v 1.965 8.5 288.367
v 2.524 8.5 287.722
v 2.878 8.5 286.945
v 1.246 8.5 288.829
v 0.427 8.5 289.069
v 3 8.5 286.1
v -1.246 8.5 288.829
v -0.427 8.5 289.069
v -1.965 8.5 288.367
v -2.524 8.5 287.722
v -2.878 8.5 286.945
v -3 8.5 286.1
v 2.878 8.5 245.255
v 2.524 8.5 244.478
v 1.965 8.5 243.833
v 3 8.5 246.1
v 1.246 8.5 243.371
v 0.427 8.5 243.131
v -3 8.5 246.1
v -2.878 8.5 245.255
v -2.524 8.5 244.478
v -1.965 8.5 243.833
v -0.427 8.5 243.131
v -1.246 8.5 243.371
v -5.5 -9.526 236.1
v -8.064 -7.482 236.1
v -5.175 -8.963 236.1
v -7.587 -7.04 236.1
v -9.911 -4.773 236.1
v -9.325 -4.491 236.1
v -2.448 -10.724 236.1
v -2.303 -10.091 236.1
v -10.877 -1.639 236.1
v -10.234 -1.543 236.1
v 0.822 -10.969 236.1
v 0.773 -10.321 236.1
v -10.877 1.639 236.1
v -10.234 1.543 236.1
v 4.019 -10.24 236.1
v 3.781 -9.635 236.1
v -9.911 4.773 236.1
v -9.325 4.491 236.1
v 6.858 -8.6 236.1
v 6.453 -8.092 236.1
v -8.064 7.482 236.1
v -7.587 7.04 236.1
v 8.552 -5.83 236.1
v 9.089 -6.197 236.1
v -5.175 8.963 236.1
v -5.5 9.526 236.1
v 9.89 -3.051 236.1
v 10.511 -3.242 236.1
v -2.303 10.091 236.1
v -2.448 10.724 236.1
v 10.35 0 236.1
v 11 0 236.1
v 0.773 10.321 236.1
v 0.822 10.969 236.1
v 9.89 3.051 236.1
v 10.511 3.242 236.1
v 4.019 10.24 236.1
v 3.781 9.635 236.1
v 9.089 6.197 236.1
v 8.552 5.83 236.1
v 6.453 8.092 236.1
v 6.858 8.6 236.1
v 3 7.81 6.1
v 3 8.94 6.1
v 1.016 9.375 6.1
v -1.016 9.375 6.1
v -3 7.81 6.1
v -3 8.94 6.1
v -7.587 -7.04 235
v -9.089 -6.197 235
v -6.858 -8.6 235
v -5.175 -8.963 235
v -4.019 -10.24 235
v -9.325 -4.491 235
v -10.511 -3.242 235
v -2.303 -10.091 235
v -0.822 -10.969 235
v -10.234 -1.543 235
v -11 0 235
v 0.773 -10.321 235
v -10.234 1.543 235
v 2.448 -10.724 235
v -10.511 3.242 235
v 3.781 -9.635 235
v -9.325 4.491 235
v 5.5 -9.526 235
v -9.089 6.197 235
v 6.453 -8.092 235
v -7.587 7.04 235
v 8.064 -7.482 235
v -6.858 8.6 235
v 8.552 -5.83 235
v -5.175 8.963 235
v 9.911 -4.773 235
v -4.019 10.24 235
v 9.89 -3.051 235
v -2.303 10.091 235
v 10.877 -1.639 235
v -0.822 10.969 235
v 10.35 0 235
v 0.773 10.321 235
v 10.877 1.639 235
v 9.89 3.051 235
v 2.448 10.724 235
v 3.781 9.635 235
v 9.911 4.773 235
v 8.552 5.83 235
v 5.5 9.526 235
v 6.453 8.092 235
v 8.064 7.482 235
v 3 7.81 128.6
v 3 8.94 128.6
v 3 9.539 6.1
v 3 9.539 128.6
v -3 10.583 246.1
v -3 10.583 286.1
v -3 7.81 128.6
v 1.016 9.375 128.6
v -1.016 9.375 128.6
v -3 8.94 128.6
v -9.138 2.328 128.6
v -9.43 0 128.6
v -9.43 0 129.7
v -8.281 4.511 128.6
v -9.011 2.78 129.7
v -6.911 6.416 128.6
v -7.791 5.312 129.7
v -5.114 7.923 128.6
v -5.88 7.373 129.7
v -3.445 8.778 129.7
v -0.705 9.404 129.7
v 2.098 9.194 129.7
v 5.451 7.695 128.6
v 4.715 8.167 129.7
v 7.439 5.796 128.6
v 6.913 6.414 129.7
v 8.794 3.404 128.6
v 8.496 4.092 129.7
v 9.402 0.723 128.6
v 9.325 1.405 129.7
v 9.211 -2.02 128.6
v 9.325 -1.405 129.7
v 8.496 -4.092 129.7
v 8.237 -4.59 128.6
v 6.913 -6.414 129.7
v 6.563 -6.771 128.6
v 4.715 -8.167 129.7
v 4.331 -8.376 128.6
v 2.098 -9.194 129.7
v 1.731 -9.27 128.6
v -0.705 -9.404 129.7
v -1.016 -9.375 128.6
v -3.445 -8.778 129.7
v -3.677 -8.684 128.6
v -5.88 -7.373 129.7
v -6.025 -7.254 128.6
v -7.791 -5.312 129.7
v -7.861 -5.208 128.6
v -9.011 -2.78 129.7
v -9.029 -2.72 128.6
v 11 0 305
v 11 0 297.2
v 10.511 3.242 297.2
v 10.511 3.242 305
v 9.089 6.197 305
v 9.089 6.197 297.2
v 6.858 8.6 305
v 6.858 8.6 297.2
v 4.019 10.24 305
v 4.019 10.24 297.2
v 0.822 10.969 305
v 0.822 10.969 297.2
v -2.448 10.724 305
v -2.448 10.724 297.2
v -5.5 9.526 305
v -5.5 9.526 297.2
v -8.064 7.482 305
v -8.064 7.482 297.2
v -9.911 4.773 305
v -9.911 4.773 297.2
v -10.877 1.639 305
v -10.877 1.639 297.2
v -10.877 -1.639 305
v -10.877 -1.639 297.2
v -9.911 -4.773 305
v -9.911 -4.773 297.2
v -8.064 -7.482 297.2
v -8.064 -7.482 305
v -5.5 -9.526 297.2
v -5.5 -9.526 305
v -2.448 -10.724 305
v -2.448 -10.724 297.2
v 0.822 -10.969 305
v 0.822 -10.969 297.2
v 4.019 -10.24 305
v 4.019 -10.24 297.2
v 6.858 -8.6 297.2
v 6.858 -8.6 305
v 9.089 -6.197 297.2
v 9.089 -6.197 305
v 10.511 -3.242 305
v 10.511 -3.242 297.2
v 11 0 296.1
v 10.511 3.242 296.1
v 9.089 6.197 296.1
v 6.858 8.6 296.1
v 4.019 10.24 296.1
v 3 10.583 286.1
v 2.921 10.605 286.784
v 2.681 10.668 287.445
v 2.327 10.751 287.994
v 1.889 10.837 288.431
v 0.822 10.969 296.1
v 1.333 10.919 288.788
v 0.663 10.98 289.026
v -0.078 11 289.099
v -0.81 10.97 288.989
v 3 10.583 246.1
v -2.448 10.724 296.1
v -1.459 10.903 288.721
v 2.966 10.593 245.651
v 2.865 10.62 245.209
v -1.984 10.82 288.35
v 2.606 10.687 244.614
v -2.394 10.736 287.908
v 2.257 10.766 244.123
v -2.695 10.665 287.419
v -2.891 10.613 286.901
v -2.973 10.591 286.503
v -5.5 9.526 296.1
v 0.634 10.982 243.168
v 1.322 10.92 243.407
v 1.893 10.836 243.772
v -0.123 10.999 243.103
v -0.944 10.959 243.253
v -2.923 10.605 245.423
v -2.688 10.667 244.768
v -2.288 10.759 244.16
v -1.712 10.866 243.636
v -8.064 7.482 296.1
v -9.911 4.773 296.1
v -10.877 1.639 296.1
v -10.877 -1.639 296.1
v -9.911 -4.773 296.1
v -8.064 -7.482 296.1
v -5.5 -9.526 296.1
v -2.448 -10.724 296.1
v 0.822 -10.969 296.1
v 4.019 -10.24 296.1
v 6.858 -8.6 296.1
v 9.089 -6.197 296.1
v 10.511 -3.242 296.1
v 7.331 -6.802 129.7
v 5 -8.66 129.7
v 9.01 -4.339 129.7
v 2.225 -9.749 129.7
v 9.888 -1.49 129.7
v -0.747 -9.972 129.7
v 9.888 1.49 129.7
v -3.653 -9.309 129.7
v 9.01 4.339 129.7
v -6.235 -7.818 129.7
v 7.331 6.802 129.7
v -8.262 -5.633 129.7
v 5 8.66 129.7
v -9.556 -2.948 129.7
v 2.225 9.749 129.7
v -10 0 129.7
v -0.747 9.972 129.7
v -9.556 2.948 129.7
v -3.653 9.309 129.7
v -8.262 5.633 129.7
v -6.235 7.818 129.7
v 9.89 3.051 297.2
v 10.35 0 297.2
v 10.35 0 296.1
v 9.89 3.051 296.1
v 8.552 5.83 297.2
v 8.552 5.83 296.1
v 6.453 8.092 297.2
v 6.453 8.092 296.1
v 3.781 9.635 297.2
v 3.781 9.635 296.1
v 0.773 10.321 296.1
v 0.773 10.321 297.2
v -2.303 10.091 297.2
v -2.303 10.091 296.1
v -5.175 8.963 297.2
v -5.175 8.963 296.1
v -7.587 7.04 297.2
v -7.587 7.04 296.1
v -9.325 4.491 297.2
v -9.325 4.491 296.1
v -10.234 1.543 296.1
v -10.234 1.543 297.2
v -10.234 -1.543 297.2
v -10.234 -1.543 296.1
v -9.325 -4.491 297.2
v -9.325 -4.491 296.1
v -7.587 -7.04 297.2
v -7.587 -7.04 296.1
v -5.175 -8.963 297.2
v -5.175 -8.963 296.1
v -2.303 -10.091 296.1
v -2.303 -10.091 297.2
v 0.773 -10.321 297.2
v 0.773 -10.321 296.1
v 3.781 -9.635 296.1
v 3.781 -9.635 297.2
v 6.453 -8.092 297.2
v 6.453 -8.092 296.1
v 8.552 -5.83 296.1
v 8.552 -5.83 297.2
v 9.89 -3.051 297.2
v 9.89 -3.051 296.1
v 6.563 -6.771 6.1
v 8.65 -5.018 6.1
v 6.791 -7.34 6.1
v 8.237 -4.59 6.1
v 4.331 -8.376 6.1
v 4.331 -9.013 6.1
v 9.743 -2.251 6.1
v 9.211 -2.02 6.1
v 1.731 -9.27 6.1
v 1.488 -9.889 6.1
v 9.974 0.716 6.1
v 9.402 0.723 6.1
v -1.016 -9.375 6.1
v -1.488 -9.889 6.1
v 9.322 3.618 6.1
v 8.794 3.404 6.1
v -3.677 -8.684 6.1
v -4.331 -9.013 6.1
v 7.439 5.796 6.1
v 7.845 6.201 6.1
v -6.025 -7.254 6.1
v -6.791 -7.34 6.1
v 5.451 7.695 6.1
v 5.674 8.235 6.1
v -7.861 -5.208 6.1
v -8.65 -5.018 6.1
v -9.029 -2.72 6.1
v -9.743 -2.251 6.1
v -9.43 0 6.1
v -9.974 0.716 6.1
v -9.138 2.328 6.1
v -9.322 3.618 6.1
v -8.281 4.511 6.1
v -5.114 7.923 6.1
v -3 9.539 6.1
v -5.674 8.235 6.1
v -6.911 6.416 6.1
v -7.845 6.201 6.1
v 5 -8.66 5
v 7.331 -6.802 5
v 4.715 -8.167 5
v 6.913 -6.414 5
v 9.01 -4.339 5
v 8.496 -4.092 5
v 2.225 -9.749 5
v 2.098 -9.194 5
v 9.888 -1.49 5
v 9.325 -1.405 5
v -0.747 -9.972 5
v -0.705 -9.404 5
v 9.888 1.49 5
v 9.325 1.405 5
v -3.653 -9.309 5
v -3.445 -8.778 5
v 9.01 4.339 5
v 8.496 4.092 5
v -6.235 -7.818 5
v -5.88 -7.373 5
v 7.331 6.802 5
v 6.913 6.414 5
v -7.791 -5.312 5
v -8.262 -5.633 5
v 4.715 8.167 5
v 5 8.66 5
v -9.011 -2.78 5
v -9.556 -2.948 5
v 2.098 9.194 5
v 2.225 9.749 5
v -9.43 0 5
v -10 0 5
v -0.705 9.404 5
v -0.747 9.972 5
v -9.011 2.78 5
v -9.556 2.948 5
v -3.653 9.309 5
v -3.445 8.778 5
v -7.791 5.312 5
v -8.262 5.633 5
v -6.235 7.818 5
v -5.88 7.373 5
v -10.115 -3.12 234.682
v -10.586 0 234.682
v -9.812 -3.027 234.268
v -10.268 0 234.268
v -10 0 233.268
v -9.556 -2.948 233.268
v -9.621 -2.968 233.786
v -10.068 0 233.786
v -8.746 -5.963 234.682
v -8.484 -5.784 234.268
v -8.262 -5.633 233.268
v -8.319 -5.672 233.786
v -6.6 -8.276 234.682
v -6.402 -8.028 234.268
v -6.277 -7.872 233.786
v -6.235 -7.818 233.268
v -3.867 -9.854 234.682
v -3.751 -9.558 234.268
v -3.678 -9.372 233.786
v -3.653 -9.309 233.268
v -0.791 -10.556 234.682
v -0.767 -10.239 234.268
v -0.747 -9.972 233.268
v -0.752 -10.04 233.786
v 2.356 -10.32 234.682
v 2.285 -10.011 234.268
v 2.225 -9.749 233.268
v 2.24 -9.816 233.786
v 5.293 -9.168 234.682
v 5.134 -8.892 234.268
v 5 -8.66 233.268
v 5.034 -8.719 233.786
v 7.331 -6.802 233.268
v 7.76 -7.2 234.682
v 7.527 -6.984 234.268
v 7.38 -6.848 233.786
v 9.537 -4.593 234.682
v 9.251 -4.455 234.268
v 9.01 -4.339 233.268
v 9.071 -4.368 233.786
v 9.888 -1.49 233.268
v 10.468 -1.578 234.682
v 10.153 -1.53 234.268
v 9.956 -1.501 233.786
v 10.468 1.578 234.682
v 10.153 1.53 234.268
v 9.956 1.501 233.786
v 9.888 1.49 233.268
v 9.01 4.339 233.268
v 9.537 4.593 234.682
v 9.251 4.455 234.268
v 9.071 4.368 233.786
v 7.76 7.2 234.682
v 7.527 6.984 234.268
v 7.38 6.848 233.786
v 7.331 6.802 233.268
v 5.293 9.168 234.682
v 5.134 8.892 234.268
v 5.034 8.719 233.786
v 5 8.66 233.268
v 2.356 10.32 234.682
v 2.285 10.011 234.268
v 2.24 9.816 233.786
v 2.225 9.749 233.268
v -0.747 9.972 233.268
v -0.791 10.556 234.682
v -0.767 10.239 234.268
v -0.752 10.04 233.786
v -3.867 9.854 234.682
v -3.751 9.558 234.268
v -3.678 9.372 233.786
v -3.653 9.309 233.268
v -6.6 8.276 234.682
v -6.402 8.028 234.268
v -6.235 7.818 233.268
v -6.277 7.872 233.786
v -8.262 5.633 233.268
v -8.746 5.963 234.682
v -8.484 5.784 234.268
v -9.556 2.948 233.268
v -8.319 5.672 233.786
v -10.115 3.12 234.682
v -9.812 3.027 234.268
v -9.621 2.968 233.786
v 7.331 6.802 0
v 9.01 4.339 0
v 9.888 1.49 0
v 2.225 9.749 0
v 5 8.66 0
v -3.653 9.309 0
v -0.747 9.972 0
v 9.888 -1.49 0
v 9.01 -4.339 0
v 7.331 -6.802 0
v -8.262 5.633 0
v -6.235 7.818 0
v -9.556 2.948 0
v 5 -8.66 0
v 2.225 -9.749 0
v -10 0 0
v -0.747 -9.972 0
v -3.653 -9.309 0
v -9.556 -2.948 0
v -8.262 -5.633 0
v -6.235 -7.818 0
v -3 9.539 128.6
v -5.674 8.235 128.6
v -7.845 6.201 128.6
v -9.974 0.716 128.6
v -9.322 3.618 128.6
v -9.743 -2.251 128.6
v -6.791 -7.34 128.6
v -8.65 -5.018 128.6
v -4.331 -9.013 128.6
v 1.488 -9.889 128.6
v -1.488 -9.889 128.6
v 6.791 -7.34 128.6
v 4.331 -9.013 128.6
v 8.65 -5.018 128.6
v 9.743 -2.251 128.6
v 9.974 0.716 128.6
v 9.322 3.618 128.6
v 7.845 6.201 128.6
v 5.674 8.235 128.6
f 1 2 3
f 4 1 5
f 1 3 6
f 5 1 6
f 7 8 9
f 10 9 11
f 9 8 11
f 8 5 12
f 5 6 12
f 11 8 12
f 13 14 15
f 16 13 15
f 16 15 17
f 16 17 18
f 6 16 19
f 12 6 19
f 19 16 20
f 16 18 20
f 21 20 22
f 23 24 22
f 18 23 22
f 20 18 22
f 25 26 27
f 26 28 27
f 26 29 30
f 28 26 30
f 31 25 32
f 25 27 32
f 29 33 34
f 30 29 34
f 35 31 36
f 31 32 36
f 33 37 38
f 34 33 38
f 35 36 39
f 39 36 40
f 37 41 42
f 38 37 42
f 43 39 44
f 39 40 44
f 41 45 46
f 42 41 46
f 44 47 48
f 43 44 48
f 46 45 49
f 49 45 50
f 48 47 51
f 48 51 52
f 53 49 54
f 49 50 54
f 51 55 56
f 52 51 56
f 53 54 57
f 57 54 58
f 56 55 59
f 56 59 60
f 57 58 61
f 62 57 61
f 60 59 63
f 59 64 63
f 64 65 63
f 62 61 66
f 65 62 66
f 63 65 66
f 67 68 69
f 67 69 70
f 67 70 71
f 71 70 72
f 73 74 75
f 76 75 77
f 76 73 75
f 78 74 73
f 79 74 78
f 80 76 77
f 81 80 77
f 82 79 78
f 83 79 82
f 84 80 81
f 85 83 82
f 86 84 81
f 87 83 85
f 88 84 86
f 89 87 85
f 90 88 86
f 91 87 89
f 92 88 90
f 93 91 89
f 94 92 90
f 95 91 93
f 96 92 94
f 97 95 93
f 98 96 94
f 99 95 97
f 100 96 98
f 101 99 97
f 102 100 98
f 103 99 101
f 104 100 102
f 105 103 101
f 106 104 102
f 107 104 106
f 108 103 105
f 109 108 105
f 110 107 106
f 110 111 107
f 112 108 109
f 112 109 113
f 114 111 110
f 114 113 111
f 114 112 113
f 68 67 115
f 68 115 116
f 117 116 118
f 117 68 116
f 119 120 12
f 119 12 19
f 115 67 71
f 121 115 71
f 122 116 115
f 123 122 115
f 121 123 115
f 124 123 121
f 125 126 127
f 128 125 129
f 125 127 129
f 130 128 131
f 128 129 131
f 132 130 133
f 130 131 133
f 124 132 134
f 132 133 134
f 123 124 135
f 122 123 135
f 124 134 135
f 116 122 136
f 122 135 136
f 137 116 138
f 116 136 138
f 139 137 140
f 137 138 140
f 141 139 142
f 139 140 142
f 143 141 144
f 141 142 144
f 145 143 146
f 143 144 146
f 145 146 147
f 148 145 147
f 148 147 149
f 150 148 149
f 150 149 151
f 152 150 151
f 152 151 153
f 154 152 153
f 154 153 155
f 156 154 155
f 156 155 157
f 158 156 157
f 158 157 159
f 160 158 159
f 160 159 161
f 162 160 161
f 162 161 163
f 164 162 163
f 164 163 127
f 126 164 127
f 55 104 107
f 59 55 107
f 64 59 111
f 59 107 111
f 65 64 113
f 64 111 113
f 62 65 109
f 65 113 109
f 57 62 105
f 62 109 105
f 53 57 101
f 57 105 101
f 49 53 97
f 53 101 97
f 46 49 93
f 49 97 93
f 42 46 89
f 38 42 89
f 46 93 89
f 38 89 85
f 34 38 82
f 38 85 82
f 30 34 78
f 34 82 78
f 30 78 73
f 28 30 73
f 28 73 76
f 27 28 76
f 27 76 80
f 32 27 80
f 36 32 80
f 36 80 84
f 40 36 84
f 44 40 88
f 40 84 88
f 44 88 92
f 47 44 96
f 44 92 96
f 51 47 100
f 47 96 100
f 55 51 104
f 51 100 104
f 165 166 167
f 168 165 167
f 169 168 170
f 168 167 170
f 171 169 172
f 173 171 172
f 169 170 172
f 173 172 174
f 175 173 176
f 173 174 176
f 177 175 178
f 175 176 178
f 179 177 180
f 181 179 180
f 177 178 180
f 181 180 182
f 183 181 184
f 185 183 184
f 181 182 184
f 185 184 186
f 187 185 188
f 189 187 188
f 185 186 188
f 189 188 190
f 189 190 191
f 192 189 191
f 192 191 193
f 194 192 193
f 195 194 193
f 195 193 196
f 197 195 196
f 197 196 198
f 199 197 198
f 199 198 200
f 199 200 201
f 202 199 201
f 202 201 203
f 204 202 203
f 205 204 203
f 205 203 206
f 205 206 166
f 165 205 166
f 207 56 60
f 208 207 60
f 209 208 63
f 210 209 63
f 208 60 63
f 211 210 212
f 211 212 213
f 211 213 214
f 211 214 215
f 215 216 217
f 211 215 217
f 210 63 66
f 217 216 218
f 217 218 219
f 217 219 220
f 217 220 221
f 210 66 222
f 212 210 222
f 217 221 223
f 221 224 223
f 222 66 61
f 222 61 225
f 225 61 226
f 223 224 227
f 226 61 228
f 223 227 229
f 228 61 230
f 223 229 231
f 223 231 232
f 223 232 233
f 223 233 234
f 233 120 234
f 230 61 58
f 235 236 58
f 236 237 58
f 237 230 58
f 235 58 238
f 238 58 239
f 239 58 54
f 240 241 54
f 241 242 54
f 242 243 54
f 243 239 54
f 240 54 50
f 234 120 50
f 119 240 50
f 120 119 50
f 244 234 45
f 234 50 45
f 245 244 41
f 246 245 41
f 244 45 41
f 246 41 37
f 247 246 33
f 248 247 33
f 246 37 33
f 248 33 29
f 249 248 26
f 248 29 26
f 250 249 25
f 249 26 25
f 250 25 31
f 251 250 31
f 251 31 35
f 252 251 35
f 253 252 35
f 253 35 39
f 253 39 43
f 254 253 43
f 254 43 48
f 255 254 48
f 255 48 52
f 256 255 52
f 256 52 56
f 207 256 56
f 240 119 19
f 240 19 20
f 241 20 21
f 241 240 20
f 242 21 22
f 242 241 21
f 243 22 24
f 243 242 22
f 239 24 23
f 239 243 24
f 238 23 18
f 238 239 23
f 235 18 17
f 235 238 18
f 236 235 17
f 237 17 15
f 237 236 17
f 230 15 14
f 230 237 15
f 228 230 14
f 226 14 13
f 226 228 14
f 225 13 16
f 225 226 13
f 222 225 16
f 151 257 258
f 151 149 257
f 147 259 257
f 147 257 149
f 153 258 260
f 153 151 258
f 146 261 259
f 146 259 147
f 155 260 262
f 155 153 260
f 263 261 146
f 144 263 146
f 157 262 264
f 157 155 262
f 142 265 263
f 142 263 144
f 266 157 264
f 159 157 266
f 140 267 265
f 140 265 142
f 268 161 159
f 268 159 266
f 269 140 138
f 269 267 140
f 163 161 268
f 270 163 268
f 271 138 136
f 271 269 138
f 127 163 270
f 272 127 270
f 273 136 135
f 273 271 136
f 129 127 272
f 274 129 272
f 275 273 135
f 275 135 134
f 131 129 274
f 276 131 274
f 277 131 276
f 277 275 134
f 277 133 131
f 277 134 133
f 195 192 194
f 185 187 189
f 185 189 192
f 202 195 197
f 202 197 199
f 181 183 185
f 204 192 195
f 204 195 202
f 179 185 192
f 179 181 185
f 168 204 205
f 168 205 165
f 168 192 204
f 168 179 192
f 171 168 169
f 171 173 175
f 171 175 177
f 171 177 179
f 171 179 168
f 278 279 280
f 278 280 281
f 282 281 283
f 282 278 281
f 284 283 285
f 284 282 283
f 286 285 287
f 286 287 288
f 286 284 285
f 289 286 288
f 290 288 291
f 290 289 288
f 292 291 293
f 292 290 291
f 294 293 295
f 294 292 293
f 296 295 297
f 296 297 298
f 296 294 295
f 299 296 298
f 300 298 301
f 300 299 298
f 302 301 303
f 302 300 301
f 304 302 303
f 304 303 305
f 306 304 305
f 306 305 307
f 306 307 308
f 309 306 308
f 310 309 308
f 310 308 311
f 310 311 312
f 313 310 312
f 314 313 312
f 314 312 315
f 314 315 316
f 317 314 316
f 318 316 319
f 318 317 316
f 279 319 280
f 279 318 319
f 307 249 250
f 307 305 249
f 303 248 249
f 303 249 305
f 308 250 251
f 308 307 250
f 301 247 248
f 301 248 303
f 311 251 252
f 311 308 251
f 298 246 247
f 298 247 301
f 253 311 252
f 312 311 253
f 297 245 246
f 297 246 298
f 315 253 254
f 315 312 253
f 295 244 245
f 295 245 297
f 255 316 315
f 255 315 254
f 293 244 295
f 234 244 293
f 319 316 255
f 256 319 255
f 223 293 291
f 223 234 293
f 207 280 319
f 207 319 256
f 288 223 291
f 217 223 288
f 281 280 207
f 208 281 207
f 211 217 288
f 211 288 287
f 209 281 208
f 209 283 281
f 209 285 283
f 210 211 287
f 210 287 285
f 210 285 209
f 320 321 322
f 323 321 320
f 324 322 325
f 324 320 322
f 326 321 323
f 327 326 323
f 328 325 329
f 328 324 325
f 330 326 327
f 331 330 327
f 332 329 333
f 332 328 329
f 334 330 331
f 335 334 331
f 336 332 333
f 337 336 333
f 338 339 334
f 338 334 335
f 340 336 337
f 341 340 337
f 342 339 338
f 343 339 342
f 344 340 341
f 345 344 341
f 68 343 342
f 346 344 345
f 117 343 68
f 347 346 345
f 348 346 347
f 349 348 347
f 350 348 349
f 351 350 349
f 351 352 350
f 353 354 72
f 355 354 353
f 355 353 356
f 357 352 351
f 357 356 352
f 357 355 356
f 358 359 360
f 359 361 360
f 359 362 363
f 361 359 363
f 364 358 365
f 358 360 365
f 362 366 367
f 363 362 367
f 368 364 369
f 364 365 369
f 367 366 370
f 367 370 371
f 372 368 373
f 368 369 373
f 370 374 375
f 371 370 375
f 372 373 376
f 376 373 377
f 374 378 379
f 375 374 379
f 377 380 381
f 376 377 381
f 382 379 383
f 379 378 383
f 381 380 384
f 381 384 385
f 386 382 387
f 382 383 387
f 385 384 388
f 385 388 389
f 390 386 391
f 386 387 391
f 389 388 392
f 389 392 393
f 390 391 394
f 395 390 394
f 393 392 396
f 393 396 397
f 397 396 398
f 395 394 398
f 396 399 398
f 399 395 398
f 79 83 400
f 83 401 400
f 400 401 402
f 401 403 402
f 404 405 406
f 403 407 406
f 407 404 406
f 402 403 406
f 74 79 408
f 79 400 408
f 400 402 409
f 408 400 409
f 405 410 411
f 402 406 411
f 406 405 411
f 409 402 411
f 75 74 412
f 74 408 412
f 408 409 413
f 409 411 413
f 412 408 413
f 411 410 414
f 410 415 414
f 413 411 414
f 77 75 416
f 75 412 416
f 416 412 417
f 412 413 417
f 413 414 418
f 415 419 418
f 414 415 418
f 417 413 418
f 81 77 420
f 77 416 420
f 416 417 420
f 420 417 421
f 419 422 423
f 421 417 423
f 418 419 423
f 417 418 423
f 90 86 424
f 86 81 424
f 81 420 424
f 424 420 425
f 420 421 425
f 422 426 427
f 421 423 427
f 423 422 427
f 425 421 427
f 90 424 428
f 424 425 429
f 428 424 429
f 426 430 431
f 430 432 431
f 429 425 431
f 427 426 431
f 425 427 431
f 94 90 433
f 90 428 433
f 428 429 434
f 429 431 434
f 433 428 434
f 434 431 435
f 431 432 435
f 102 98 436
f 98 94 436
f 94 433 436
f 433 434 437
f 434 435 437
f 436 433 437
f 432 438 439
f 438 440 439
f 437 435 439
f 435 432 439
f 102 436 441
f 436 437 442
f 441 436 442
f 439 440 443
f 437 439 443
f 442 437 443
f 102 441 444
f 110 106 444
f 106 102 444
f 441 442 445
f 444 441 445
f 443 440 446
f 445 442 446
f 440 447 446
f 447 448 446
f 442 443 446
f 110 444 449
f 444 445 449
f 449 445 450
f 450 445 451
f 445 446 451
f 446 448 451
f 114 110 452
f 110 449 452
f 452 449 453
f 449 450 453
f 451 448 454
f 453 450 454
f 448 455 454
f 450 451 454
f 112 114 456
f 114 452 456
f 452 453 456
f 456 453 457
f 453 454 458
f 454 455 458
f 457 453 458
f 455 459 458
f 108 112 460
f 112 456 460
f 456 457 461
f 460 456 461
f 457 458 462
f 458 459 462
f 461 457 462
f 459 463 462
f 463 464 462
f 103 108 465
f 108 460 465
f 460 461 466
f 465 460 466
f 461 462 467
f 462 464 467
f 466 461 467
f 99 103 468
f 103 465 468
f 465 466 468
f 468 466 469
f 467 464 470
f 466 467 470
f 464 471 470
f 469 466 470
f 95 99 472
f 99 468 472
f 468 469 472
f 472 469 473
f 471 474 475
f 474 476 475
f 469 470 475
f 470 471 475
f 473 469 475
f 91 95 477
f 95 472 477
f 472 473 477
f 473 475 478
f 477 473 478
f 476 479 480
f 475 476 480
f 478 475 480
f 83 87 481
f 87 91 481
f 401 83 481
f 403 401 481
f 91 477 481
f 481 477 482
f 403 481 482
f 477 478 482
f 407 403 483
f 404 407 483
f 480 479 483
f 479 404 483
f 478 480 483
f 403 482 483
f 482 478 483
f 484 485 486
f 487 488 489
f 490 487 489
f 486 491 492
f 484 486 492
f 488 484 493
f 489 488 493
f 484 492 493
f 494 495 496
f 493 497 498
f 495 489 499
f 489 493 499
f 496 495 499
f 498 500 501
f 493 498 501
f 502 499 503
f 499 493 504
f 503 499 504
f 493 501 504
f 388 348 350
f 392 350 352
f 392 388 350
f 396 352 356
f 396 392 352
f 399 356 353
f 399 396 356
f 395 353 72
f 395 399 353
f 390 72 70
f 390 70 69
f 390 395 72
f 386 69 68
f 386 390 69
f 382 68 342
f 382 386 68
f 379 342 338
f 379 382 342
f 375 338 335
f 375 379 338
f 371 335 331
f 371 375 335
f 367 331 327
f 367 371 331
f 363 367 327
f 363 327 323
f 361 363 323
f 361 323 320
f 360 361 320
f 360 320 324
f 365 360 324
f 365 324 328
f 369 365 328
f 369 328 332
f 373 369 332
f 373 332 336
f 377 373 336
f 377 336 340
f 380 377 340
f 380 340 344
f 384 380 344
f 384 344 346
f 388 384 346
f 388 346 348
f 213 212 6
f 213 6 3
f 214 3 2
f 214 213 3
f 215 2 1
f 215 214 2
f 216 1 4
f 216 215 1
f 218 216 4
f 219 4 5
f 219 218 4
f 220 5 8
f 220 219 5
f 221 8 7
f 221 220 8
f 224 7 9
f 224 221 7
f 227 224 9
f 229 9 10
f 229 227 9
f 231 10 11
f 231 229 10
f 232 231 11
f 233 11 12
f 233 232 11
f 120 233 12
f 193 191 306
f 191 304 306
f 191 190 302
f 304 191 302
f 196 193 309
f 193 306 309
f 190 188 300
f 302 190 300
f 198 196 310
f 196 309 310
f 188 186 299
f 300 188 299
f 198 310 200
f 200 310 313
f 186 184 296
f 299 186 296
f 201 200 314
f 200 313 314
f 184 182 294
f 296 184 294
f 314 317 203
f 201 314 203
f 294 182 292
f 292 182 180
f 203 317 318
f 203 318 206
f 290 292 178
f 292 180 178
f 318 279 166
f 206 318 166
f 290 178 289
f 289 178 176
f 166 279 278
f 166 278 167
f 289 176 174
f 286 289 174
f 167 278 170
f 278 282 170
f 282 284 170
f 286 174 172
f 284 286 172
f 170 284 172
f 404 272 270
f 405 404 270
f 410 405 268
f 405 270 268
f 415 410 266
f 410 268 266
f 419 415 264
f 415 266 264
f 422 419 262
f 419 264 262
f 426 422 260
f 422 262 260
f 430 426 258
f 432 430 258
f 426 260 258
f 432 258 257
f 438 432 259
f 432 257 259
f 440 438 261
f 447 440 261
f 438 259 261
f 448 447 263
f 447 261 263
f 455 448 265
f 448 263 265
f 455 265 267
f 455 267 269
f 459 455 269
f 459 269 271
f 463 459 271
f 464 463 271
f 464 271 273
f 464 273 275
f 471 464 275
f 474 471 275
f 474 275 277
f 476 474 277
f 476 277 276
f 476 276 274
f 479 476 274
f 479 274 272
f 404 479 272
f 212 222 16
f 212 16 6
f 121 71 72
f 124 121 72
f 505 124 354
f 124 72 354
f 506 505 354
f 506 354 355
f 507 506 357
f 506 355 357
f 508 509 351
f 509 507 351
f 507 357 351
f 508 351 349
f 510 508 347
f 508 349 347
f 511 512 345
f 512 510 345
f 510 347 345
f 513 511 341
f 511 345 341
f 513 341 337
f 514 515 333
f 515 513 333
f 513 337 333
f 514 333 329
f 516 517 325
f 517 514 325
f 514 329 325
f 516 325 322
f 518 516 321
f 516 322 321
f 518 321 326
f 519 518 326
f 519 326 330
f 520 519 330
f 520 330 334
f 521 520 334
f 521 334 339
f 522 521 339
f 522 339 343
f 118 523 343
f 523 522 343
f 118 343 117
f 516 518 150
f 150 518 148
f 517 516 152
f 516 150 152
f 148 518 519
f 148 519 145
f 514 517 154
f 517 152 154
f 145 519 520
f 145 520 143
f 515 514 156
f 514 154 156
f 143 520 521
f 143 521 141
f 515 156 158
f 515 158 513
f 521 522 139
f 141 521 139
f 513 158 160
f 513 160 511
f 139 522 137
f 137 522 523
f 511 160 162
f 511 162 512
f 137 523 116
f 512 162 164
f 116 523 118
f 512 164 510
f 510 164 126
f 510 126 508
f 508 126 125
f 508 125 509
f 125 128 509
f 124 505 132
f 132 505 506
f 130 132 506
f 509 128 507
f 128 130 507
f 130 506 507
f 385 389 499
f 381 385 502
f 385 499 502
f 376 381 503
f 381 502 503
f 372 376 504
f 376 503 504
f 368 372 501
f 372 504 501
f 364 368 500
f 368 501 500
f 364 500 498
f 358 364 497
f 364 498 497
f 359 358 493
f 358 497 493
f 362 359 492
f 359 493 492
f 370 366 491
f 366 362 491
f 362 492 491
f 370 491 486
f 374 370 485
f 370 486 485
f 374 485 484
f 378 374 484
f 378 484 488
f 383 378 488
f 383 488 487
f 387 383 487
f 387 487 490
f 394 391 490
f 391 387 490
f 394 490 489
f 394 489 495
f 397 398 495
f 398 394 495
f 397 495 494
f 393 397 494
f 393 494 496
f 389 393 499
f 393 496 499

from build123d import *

# Parameters (mm, degrees)
SKETCH2_R           = 10
BOSS_EXTRUDE1_DEPTH = 235
SKETCH3_R           = 10
SKETCH3_R_2         = 9.43
CUT_EXTRUDE2_DEPTH  = 1.1
SKETCH4_W           = 6
SKETCH4_H           = 3.067792635
CUT_EXTRUDE3_DEPTH  = 61.25
SKETCH5_R           = 11
BOSS_EXTRUDE2_DEPTH = 70
FILLET3_R           = 2
SKETCH6_R           = 11
SKETCH6_R_2         = 10.35
CUT_EXTRUDE4_DEPTH  = 1.1
CUT_EXTRUDE5_DEPTH  = 2.5


with BuildPart() as part:
    # Sketch2 → Boss-Extrude1 (new body)
    with BuildSketch(Plane.XY):
        with Locations(Location((0, 0, 0), (0, 0, 180))):
            Circle(SKETCH2_R)
    extrude(amount=BOSS_EXTRUDE1_DEPTH)

    # Sketch3 → Cut-Extrude2 (cut)
    with BuildSketch(Plane(origin=(0, 0, 5), x_dir=(-1, 0, 0), z_dir=(0, 0, -1))):
        Circle(SKETCH3_R)
        Circle(SKETCH3_R_2, mode=Mode.SUBTRACT)
    cut_extrude2 = extrude(amount=-CUT_EXTRUDE2_DEPTH, mode=Mode.SUBTRACT)

    # Mirror1: Cut-Extrude2 across plane
    add(cut_extrude2.mirror(Plane(origin=(0, 0, 67.35), x_dir=(1, 0, 0), z_dir=(0, 0, -1))), mode=Mode.SUBTRACT)

    # Sketch4 → Cut-Extrude3 (cut, symmetric)
    with BuildSketch(Plane(origin=(0, 0, 67.35), x_dir=(-1, 0, 0), z_dir=(0, 0, -1))):
        with Locations((0, 9.343896318)):
            Rectangle(SKETCH4_W, SKETCH4_H)
    extrude(amount=CUT_EXTRUDE3_DEPTH, both=True, mode=Mode.SUBTRACT)

    # Sketch5 → Boss-Extrude2 (add)
    with BuildSketch(Plane.XY.offset(235)):
        Circle(SKETCH5_R)
    extrude(amount=BOSS_EXTRUDE2_DEPTH)

    # Fillet3
    # the kernel refuses this fillet: 2 mm, written as the material it adds along each edge
    with BuildSketch(Plane(origin=(0, 0, 235), x_dir=(-1, 0, 0), z_dir=(0, 1, 0))) as fillet3_piece_1:
        with BuildLine():
            CenterArc((12, -1.732050808), FILLET3_R, 120, 60)
            Line((10, -1.732050808), (9.96, -1.732050808))
            Line((9.96, -1.732050808), (9.96, 0))
            Line((9.96, 0), (10, 0.04))
            ThreePointArc((10, 0.04), (10.5, 0.04), (10.98, 0.034641016))
            Line((10.98, 0.034641016), (11, 0))
        make_face()
    revolve(axis=Axis((0, 0, 235), (0, 0, 1)))

    # Sketch6 → Cut-Extrude4 (cut)
    with BuildSketch(Plane.XY.offset(235)):
        Circle(SKETCH6_R)
        Circle(SKETCH6_R_2, mode=Mode.SUBTRACT)
    cut_extrude4 = extrude(amount=CUT_EXTRUDE4_DEPTH, mode=Mode.SUBTRACT)

    # Mirror2: Cut-Extrude4 across plane
    add(cut_extrude4.mirror(Plane.XY.offset(266.1)), mode=Mode.SUBTRACT)

    # Sketch8 → Cut-Extrude5 (cut)
    with BuildSketch(Plane(origin=(0, 11, 0), x_dir=(1, 0, 0), z_dir=(0, 1, 0))):
        with BuildLine():
            Line((3, -246.1), (3, -286.1))
            ThreePointArc((3, -286.1), (0, -289.1), (-3, -286.1))
            Line((-3, -286.1), (-3, -246.1))
            ThreePointArc((-3, -246.1), (0, -243.1), (3, -246.1))
        make_face()
    extrude(amount=-CUT_EXTRUDE5_DEPTH, mode=Mode.SUBTRACT)


solid = part.part
